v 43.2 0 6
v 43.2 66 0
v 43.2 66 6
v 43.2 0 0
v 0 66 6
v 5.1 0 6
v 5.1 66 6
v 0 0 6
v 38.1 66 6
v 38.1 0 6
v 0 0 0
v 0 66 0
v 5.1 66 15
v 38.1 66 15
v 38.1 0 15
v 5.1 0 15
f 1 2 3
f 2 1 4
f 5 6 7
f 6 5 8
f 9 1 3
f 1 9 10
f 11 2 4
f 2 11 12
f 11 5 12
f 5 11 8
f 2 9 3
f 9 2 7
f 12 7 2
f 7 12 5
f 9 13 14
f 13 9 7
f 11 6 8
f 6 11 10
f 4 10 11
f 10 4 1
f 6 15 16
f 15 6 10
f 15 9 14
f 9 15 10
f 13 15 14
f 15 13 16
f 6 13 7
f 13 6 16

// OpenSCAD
// Minimum render angle
$fa = 5;
// Minimum render size
$fs = 1;

body_width = 43.2;
body_length = 66;
body_height = 6;

inside_width = 33;
inside_length = body_length;
inside_height = 14;
inside_offset = (body_width - inside_width)/2;

color( "green" ) mainUnitShape();

module mainUnitShape()
{
	cube( [body_width, body_length, body_height] );
	translate( [inside_offset, 0, 0] ) cube( [inside_width, inside_length, inside_height + 1] );
}
